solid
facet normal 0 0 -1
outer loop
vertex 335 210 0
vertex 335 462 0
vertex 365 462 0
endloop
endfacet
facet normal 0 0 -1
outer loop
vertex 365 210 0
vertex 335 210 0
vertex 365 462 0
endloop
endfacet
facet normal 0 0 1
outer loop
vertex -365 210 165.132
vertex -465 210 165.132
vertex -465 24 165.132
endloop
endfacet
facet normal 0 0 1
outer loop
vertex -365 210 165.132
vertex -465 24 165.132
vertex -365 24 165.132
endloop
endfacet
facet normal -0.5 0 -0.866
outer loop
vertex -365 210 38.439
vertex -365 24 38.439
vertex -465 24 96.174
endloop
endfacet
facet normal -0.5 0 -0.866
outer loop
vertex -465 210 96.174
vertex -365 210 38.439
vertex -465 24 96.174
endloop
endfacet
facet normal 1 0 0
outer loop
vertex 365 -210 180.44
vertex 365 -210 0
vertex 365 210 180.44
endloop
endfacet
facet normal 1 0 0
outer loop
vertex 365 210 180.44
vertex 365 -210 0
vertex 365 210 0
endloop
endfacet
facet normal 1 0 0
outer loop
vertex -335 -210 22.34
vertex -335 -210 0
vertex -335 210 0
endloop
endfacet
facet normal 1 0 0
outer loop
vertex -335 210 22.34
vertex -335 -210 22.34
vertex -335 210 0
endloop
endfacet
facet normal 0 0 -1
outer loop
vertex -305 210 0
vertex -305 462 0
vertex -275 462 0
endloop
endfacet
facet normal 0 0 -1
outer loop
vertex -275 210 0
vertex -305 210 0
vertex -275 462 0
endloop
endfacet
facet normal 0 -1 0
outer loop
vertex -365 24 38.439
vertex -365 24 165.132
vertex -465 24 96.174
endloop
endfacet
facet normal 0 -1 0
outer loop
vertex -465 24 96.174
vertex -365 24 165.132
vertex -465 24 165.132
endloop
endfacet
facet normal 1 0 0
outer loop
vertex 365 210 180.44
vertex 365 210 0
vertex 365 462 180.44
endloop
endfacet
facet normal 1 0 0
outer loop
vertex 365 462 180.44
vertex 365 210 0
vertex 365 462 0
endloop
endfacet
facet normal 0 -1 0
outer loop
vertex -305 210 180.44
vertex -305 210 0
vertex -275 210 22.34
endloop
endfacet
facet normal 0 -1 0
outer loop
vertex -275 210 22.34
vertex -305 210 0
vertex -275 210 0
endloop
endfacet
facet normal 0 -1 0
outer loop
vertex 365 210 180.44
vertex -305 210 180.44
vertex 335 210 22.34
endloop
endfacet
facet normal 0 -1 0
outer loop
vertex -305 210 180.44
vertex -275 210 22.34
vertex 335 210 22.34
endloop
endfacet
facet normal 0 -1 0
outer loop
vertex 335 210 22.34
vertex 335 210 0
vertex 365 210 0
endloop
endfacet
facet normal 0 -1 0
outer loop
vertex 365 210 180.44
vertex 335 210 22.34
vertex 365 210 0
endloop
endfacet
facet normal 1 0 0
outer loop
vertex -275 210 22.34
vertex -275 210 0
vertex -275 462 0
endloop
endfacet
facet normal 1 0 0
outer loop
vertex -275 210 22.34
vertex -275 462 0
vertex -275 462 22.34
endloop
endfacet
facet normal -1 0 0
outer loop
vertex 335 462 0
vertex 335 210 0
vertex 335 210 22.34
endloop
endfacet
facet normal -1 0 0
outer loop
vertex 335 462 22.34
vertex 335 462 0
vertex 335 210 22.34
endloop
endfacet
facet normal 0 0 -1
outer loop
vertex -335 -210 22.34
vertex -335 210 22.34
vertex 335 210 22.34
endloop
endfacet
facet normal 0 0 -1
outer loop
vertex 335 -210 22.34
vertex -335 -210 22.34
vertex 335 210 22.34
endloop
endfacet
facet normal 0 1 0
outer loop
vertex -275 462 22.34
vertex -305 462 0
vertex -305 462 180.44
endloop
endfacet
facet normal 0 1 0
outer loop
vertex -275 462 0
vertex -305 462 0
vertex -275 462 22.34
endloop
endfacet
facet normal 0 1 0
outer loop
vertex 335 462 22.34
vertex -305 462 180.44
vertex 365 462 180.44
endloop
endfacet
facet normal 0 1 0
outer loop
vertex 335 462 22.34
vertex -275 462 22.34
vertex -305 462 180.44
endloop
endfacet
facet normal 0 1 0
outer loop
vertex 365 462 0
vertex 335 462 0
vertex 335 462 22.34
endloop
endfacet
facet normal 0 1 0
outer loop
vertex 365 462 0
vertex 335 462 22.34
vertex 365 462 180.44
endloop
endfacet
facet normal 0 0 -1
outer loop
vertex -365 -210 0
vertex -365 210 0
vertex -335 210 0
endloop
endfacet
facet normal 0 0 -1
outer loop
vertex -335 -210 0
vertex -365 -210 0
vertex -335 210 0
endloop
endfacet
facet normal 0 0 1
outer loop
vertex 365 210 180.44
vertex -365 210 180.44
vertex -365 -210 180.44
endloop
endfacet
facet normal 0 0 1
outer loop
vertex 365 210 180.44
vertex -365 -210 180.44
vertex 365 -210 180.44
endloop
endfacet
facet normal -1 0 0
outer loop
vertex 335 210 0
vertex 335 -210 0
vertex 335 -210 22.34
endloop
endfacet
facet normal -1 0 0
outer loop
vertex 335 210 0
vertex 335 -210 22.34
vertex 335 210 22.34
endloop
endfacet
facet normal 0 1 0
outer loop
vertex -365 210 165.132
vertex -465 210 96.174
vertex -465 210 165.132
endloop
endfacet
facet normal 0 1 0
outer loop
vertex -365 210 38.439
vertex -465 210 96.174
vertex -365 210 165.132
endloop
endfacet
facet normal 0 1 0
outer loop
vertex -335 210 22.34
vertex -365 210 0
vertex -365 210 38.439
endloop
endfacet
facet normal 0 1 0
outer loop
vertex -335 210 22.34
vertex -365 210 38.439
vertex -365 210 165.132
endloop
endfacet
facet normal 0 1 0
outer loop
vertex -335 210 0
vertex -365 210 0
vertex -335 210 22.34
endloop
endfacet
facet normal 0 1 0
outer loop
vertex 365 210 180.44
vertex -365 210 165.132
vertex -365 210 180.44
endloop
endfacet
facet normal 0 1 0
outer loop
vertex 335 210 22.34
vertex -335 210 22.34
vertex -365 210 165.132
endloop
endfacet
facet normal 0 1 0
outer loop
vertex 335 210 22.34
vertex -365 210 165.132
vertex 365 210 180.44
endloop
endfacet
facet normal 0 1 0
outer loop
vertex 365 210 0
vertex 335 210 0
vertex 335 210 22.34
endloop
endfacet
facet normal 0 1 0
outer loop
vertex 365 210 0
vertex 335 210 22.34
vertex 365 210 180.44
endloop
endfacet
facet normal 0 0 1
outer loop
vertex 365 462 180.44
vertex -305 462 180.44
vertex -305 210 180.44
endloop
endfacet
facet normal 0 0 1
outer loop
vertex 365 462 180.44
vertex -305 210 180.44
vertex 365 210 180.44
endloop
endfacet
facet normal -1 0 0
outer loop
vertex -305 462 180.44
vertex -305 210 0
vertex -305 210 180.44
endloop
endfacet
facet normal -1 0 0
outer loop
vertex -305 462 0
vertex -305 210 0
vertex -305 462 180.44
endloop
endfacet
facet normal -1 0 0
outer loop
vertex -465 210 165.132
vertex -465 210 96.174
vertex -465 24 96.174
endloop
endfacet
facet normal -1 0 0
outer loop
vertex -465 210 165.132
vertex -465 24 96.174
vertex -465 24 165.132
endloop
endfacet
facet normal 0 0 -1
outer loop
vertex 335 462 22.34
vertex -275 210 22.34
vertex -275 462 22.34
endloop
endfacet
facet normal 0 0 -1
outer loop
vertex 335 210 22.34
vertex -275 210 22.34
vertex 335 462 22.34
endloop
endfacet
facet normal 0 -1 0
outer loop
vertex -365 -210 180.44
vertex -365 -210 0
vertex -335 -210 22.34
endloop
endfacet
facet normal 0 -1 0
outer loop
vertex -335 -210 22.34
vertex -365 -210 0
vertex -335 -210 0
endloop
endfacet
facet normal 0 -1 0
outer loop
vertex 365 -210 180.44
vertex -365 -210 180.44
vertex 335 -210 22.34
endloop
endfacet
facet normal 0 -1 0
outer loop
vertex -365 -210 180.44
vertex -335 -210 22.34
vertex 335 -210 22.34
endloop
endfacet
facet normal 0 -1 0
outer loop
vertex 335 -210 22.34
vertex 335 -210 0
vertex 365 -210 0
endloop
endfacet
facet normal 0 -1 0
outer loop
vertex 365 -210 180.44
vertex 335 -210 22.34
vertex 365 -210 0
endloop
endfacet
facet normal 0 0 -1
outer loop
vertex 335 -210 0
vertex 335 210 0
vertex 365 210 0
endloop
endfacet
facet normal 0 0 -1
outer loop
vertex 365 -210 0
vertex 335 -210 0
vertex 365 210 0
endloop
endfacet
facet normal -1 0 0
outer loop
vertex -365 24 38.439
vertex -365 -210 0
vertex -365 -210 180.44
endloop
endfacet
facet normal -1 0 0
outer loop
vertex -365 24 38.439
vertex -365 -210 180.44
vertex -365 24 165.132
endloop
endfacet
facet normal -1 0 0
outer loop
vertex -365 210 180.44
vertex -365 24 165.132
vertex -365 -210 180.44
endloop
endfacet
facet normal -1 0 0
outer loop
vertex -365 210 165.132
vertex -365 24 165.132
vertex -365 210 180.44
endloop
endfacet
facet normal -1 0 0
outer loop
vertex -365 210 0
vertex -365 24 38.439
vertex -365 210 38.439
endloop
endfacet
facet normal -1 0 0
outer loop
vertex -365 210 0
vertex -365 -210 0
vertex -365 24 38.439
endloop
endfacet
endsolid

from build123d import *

# Parameters (mm, degrees)
SKETCH_W     = 730
SKETCH_H     = 420
PAD_DEPTH    = 158.1
SKETCH001_W  = 30
SKETCH001_H  = 420
PAD001_DEPTH = 22.34
PAD002_DEPTH = 186
SKETCH003_W  = 670
SKETCH003_H  = 252
PAD003_DEPTH = 180.44
SKETCH004_W  = 610
SKETCH004_H  = 22.34
POCKET_DEPTH = 462.001


with BuildPart() as harpia:
    # Sketch → Pad (new body)
    with BuildSketch(Plane.XY.offset(22.34)):
        Rectangle(SKETCH_W, SKETCH_H)
    extrude(amount=PAD_DEPTH)

    # Sketch001 → Pad001 (join)
    with BuildSketch(Plane.XY):
        with Locations((-350, 0)):
            Rectangle(SKETCH001_W, SKETCH001_H)
        with Locations((350, 0)):
            Rectangle(SKETCH001_W, SKETCH001_H)
    extrude(amount=PAD001_DEPTH)

    # Sketch002 → Pad002 (join)
    with BuildSketch(Plane.XZ.offset(-210)):
        Polygon((-465, 165.132446), (-365, 165.132446), (-365, 38.438764), (-465, 96.173791), align=None)
    extrude(amount=PAD002_DEPTH)


with BuildPart() as harpia_tb:
    # Sketch003 → Pad003 (new body)
    with BuildSketch(Plane.XY):
        with Locations((30, 336)):
            Rectangle(SKETCH003_W, SKETCH003_H)
    extrude(amount=PAD003_DEPTH)

    # Sketch004 → Pocket (cut, through all)
    with BuildSketch(Plane.XZ):
        with Locations((30, 11.17)):
            Rectangle(SKETCH004_W, SKETCH004_H)
    extrude(amount=-POCKET_DEPTH, mode=Mode.SUBTRACT)


solid = Compound([harpia.part, harpia_tb.part])
